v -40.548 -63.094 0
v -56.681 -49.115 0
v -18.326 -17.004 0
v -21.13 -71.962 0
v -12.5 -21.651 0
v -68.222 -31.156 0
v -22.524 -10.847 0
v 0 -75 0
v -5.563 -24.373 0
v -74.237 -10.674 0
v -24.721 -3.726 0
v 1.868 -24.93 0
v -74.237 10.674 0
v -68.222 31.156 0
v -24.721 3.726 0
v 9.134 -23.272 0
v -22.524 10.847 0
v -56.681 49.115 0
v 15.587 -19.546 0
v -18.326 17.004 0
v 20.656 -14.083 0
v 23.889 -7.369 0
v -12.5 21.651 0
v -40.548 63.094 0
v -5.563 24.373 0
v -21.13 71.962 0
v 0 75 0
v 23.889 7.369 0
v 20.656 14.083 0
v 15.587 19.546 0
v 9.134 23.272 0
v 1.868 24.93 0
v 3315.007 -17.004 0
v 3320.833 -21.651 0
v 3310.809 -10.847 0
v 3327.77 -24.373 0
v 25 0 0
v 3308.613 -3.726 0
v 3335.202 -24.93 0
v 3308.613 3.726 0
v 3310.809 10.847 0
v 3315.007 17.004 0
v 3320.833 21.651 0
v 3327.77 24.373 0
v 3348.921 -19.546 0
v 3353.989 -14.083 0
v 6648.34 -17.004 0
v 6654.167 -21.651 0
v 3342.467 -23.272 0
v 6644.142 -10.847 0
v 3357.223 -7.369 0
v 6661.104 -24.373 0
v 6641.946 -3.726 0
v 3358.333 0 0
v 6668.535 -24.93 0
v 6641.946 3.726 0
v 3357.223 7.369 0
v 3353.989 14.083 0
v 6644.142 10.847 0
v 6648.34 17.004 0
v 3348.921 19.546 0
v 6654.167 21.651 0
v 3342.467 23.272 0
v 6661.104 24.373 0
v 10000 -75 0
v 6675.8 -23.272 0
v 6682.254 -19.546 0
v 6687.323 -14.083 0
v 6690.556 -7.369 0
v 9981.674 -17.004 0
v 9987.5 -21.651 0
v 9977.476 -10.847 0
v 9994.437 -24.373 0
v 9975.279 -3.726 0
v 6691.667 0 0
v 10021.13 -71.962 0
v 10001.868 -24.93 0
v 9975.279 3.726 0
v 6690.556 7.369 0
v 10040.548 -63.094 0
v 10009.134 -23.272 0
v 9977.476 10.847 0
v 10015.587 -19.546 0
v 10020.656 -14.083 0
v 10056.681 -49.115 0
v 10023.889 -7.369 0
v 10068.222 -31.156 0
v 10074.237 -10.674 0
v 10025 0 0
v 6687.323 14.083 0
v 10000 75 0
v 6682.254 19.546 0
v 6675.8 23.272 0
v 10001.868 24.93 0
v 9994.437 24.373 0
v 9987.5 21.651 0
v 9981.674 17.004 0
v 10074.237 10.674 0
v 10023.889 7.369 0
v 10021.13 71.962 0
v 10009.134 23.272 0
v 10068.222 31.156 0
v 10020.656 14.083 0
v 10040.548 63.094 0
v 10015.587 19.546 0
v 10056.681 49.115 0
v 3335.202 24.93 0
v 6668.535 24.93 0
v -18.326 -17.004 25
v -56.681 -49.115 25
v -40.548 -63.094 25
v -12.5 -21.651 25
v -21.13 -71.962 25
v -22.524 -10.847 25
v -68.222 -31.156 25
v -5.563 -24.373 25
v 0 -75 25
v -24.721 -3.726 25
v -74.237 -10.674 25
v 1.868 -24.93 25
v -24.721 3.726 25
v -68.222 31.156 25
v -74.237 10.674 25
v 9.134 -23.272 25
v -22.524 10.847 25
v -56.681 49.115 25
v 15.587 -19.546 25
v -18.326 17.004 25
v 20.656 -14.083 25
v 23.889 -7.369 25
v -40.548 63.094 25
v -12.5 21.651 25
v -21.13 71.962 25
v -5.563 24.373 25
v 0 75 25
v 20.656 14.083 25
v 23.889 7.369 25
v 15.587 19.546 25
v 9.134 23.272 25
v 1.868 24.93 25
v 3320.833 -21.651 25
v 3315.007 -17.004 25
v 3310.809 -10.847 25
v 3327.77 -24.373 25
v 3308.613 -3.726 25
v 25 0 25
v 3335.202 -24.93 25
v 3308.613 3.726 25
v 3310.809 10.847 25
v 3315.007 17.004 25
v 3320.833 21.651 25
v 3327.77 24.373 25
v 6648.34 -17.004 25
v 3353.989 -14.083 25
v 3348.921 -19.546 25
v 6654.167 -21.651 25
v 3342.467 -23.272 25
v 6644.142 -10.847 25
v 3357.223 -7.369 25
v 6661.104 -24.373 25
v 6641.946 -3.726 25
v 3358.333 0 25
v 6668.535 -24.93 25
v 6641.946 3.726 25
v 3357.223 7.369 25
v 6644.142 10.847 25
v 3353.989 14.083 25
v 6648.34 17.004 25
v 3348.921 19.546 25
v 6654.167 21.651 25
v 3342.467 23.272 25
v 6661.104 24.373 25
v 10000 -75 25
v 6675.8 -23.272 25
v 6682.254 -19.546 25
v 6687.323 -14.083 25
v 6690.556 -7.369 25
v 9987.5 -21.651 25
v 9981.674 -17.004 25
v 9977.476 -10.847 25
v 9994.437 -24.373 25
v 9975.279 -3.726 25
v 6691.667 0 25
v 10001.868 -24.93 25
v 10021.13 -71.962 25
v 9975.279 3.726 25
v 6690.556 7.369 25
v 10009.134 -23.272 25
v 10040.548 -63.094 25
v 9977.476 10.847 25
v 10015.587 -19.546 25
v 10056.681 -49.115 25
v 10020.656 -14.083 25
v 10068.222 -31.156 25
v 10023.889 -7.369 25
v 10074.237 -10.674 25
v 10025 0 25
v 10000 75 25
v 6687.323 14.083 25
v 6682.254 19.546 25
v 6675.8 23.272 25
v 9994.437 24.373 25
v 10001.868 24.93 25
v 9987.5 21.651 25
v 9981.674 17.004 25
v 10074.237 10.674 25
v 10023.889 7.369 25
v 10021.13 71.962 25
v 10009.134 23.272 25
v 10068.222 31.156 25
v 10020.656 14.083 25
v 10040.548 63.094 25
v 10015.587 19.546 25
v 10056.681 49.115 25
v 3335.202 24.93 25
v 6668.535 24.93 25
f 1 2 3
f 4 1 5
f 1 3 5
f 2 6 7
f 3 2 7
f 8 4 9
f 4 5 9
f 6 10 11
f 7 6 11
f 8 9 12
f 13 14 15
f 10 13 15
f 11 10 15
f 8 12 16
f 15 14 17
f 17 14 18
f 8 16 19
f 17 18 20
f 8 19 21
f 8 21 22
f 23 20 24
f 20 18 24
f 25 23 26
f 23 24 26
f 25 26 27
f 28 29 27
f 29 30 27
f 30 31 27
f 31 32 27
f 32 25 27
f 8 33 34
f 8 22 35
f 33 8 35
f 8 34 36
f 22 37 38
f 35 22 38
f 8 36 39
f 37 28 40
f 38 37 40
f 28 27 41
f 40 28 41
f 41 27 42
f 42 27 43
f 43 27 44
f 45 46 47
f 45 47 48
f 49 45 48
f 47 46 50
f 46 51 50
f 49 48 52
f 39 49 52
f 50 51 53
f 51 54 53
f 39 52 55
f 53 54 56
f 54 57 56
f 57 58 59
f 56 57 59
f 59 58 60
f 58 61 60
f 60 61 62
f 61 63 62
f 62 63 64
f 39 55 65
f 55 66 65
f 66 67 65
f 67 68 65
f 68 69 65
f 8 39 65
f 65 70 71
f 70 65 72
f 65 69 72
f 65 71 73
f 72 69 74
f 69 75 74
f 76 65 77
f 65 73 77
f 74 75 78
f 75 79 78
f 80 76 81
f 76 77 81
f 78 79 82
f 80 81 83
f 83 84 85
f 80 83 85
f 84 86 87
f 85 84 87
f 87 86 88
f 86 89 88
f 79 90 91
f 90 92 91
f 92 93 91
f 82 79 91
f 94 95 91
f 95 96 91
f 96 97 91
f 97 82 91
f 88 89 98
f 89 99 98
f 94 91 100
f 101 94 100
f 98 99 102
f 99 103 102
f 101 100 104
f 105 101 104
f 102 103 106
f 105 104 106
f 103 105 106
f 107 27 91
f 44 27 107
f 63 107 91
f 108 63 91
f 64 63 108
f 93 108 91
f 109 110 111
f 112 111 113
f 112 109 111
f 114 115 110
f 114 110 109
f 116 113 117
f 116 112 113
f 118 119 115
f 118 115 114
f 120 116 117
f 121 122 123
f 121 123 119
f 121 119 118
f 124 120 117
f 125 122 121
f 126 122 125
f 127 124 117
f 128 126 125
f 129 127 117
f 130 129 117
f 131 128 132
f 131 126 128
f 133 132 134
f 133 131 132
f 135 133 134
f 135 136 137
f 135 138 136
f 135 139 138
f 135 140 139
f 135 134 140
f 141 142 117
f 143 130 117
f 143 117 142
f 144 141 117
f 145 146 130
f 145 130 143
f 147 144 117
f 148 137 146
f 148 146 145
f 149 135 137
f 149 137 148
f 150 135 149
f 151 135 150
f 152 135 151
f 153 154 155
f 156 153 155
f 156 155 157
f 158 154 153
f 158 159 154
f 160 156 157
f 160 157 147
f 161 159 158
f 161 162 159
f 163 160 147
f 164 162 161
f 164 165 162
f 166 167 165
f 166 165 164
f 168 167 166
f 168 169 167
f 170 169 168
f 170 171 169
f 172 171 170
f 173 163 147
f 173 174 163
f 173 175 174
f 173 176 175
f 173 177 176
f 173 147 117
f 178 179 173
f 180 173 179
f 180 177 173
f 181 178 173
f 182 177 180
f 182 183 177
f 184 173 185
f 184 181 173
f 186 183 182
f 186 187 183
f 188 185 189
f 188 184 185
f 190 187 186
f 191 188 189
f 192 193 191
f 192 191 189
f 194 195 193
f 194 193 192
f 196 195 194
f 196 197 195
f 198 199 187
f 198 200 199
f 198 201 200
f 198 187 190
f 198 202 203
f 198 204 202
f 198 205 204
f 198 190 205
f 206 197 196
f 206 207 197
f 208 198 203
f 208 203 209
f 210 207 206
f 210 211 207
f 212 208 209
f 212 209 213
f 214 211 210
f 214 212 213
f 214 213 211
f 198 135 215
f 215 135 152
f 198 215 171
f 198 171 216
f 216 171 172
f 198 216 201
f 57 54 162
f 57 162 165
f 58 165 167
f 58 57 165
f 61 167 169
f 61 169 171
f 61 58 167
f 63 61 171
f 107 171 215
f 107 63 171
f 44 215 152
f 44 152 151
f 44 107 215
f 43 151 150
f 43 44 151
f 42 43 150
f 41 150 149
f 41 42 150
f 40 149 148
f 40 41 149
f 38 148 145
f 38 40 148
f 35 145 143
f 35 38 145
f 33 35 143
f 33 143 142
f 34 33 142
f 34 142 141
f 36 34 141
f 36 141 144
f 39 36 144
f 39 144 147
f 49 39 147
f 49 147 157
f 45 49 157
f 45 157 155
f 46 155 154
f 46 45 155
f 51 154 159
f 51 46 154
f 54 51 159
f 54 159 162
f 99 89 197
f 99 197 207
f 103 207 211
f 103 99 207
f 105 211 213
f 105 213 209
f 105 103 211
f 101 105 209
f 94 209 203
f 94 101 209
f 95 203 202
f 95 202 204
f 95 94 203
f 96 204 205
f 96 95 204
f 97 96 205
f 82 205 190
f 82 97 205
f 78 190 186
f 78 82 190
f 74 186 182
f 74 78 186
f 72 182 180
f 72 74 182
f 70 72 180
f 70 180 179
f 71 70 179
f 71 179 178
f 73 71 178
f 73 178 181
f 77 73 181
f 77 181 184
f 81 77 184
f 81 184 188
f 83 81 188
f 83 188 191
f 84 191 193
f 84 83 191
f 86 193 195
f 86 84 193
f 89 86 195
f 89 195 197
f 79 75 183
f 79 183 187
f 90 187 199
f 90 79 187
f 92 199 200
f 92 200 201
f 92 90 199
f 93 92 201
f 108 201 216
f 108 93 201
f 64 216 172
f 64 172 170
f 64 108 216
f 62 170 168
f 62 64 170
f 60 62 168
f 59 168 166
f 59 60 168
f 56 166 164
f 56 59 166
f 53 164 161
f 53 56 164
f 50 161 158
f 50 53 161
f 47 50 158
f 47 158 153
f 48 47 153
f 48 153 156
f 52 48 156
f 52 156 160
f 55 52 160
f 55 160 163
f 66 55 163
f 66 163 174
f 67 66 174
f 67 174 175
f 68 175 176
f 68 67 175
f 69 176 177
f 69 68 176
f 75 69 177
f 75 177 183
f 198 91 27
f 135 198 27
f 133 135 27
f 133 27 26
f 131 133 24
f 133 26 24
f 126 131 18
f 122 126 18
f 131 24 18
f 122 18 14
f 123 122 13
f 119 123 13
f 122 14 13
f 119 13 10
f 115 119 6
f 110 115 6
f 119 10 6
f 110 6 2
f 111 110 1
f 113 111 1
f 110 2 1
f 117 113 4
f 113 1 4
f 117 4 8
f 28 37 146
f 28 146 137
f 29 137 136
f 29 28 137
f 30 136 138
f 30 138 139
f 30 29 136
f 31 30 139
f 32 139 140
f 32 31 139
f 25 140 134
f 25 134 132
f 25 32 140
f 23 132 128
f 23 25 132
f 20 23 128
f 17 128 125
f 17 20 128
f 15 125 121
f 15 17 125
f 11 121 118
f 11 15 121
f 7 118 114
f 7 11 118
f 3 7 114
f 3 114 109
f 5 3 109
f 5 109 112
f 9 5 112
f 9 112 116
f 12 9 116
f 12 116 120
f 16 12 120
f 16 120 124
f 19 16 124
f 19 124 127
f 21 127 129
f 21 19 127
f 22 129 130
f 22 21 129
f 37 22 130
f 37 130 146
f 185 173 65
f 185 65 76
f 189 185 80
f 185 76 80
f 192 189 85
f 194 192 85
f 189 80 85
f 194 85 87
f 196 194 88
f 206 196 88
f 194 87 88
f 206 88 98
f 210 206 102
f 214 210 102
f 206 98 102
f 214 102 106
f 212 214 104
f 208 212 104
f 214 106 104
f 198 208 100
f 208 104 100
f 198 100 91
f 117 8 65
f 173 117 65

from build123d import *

# Parameters (mm, degrees)
F1_R     = 25
F2_DEPTH = 25


with BuildPart() as f2:
    # F1 (on Top) → F2 (new body)
    with BuildSketch(Plane.XY):
        with BuildLine():
            ThreePointArc((0, 75), (-75, 0), (0, -75))
            Line((0, -75), (10000, -75))
            ThreePointArc((10000, -75), (10075, 0), (10000, 75))
            Line((10000, 75), (0, 75))
        make_face()
        Circle(F1_R, mode=Mode.SUBTRACT)
        with Locations((3333.333333, 0)):
            Circle(F1_R, mode=Mode.SUBTRACT)
        with Locations((6666.666667, 0)):
            Circle(F1_R, mode=Mode.SUBTRACT)
        with Locations((10000, 0)):
            Circle(F1_R, mode=Mode.SUBTRACT)
    extrude(amount=F2_DEPTH)


solid = f2.part
